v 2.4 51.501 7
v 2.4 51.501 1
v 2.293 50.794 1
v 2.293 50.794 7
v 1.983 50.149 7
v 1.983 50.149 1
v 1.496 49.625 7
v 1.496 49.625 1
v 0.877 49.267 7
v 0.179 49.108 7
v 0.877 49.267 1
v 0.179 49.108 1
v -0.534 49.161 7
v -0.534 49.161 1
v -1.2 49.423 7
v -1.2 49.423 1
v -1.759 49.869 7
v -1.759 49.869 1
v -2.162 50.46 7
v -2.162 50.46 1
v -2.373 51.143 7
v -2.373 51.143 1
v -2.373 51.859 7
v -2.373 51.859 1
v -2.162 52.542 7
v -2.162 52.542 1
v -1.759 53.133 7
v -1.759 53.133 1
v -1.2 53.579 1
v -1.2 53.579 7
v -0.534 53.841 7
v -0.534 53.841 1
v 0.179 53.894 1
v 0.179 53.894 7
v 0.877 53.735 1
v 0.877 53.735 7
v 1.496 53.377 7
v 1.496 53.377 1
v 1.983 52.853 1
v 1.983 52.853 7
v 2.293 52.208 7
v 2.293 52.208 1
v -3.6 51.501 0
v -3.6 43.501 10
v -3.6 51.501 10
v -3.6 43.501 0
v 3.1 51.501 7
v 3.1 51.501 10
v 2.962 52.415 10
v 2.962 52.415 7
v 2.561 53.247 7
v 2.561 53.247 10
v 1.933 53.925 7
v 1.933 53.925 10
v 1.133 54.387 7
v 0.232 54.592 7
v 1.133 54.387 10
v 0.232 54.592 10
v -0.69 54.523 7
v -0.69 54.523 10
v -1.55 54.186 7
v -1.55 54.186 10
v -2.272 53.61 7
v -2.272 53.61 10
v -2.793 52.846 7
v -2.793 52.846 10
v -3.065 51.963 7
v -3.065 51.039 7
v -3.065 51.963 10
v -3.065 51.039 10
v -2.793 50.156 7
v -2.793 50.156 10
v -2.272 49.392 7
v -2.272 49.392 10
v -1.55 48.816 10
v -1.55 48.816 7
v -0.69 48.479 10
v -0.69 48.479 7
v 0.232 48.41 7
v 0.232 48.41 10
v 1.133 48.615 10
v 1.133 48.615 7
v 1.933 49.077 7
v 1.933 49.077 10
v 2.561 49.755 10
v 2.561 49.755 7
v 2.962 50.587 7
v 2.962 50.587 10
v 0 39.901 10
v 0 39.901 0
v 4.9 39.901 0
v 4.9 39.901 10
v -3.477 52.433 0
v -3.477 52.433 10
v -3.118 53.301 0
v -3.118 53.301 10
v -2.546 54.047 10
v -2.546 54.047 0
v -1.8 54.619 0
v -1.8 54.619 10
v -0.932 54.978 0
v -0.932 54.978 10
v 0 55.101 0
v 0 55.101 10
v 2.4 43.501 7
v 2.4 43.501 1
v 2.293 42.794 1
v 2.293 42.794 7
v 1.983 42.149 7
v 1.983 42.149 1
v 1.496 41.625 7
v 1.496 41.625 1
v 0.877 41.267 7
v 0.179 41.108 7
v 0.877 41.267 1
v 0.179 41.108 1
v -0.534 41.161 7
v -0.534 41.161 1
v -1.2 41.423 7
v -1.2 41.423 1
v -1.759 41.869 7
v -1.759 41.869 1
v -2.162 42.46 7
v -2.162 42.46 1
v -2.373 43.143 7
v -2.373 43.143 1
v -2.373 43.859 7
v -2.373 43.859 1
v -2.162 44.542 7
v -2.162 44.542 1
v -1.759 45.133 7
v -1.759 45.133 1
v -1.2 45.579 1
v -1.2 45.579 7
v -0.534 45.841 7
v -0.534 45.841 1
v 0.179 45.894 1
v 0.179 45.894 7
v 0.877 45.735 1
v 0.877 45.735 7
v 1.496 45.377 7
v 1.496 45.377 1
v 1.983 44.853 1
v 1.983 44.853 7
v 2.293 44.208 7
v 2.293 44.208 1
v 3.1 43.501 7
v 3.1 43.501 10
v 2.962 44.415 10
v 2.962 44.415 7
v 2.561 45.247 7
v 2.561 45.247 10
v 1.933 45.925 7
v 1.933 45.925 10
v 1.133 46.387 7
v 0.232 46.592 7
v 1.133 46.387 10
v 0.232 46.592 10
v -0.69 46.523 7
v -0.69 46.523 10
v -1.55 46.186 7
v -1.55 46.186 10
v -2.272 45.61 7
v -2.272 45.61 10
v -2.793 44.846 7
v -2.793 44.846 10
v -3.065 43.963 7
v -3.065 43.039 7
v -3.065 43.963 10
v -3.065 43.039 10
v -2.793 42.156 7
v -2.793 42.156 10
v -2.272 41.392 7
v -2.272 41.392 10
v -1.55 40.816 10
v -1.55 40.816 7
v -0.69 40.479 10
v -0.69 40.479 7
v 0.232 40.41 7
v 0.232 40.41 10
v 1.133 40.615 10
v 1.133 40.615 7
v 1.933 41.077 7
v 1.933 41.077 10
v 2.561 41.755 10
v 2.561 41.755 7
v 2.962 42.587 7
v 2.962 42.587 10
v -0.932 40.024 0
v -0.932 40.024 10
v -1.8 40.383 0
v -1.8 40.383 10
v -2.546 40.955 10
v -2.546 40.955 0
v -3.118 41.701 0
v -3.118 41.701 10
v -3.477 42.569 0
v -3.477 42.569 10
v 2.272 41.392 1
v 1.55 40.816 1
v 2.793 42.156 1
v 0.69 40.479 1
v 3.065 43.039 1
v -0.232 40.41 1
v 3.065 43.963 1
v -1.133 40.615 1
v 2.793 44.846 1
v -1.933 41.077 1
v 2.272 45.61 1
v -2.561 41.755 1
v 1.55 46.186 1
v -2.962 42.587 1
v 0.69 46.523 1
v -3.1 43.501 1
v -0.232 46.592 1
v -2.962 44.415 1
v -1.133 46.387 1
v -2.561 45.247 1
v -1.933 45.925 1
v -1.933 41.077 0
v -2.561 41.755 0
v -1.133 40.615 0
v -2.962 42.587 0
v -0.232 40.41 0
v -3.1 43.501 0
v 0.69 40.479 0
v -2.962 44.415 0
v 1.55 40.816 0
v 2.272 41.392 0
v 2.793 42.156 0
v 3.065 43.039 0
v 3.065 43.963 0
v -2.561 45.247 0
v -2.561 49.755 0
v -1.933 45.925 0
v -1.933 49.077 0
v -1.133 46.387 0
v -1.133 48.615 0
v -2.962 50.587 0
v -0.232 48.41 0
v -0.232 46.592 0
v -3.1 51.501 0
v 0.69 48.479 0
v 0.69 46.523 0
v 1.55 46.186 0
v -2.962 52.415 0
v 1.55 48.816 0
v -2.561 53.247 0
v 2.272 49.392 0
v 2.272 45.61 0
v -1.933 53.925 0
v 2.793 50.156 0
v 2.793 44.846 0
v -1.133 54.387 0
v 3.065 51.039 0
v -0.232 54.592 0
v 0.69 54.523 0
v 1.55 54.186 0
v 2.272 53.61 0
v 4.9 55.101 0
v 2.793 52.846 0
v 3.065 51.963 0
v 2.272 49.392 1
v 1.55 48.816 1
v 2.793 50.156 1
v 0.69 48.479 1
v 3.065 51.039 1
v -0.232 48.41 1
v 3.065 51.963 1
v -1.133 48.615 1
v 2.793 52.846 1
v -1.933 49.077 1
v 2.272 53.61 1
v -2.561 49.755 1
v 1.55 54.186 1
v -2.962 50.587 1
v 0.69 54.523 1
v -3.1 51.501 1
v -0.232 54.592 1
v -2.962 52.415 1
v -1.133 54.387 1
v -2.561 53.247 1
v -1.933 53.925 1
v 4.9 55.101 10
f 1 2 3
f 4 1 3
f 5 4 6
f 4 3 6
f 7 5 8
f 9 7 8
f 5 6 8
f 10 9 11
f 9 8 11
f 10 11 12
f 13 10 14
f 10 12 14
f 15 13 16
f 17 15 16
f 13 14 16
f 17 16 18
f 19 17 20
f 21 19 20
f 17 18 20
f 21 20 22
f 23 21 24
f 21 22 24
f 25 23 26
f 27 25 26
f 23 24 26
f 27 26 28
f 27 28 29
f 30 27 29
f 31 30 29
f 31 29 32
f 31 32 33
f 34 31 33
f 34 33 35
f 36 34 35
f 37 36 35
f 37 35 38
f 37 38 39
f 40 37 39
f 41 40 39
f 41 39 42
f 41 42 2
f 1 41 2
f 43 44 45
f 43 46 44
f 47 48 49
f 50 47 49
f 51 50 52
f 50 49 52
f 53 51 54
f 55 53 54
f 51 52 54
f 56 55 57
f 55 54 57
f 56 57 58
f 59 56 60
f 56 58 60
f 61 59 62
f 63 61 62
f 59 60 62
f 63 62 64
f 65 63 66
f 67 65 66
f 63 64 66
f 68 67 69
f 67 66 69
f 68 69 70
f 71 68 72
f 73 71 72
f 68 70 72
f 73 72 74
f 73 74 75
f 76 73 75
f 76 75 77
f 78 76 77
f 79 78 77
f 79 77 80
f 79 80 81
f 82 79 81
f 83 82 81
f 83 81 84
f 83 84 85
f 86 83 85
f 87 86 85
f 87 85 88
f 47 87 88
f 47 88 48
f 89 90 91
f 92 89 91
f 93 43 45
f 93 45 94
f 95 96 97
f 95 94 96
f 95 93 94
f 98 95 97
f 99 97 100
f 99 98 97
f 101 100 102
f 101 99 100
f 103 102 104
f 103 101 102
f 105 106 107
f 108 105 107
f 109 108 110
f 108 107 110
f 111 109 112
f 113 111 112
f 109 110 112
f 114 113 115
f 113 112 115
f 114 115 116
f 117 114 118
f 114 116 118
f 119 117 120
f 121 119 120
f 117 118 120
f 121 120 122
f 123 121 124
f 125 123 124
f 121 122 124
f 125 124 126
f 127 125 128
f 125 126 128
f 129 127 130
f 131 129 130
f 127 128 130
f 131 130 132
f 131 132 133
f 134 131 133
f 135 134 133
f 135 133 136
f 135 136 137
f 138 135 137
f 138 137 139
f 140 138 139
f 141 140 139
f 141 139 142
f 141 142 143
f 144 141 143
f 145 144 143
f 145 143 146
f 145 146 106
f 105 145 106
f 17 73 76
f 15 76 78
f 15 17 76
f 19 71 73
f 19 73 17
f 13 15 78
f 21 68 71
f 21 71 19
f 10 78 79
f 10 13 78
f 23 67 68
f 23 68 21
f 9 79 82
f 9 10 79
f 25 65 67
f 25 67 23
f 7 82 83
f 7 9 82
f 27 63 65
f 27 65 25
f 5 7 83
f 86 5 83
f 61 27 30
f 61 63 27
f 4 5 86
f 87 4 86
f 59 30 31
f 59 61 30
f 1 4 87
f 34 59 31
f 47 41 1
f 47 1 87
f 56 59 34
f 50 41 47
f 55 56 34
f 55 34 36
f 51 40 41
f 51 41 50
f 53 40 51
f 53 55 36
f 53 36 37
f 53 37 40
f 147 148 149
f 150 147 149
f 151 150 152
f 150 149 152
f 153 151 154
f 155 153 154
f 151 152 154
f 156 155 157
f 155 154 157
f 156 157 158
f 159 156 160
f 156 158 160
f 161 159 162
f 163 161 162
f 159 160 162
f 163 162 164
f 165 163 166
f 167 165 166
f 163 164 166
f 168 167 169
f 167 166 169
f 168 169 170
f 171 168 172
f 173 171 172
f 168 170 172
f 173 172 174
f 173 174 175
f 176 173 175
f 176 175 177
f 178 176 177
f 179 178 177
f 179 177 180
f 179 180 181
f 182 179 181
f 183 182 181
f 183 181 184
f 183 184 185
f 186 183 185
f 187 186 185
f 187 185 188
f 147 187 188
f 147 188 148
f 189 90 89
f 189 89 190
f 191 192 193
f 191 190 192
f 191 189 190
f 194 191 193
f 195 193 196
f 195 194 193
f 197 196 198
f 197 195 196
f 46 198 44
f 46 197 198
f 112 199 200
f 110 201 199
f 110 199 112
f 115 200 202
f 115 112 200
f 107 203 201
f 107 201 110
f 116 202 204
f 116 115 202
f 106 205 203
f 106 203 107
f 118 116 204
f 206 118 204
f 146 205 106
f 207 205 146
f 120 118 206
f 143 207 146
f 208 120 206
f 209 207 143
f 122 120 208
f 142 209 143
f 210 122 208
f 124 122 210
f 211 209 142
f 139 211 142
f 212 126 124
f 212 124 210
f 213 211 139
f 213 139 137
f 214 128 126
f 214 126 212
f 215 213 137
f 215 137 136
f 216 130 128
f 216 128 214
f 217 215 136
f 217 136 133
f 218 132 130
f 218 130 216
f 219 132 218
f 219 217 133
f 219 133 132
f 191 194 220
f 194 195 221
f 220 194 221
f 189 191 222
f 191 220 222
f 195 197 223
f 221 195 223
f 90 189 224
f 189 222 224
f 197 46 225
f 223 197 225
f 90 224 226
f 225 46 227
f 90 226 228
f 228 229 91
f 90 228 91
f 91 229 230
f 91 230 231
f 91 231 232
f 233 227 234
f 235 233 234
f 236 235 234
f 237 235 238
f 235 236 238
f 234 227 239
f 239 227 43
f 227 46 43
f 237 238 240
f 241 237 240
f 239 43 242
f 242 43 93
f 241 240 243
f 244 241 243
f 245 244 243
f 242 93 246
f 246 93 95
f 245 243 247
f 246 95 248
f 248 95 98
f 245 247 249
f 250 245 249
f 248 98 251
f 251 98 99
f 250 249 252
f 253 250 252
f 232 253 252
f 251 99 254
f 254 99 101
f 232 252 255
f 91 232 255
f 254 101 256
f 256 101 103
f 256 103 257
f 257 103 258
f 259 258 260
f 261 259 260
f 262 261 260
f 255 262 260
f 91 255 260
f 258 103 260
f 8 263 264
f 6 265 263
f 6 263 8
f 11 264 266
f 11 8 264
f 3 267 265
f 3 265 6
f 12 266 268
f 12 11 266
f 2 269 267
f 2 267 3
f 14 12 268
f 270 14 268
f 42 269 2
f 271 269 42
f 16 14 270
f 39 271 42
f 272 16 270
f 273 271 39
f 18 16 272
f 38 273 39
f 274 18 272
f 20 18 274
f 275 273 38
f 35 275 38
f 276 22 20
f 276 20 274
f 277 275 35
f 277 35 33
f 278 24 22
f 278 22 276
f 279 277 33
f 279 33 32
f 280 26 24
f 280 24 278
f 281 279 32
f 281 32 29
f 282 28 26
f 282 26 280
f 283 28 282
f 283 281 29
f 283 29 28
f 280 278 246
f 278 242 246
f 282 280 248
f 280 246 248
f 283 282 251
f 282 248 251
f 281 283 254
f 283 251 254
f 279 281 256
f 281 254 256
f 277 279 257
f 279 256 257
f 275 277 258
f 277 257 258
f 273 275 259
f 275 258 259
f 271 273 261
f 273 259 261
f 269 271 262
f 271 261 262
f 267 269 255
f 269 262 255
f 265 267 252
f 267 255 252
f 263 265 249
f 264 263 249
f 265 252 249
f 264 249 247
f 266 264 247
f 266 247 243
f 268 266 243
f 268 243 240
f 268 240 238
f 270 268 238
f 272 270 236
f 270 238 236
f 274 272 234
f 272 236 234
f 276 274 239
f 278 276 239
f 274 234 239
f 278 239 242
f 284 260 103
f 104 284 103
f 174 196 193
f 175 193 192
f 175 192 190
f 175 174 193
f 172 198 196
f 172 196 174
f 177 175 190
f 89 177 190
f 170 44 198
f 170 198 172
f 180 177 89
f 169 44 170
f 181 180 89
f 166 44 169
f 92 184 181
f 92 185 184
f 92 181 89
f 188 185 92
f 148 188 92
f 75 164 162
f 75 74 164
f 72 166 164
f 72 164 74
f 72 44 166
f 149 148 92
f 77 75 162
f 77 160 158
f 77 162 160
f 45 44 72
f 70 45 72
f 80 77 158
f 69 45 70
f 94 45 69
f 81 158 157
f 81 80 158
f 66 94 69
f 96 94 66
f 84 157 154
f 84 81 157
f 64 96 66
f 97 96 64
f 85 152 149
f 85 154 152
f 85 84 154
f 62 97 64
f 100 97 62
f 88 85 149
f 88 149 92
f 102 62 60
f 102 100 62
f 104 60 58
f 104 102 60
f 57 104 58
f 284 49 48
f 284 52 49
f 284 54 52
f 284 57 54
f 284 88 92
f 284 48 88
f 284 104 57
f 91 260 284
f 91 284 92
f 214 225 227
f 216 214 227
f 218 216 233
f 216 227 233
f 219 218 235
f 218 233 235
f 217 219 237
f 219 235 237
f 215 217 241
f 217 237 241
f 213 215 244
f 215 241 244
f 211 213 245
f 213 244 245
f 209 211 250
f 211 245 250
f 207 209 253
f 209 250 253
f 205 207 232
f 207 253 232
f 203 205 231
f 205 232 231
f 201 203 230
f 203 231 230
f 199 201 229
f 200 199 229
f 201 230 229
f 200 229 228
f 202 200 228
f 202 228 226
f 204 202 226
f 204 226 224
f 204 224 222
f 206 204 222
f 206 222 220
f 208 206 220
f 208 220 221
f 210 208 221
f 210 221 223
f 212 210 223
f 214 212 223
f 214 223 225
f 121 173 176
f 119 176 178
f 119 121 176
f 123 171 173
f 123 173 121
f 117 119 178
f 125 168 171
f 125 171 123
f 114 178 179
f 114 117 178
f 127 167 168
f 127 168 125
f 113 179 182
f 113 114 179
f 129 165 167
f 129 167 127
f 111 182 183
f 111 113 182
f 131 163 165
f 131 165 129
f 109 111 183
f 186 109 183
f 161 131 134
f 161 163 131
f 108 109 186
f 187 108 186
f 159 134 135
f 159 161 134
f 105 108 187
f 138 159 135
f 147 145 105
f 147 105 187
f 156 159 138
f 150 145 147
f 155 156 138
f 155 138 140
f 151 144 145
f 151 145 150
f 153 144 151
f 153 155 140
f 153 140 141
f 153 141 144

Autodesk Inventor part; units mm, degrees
ref_plane "YZ Plane" through (0, 0, 0) normal (1, 0, 0) x (0, 1, 0)
ref_plane "XZ Plane" through (0, 0, 0) normal (0, 1, 0) x (-1, 0, 0)
ref_plane "XY Plane" through (0, 0, 0) normal (0, 0, 1) x (1, 0, 0)
sketch "Esboço1" plane through (0, 0, 0) normal (0, 0, 1) x (1, 0, 0)
  circle A0 centre (0, 51.501) radius 2.4 projected
  line L0 (4.9, 66.501) -> (4.9, -3.499) projected
  line L1 (-3.6, 3.501) -> (-3.6, 59.501) projected
  arc A1 (0, 55.101) -> (-3.6, 51.501) centre (0, 51.501) ccw
  circle A2 centre (0, 43.501) radius 2.4 projected
  arc A3 (-3.6, 43.501) -> (0, 39.901) centre (0, 43.501) ccw
  line L2 (4.9, 55.101) -> (0, 55.101)
  line L3 (0, 55.101) -> (0, 39.901)
  line L4 (0, 39.901) -> (4.9, 39.901)
  line L5 (4.9, 39.901) -> (4.9, 55.101)
  point P0 (0, 0)
extrude "Extrusão1" add sketch "Esboço1" along normal blind 10 contours A0 L3 L2 L0 L4 A2 | A0 L3 A2 A3 L1 A1
sketch "Esboço2" plane through (0, 0, 10) normal (0, 0, 1) x (1, 0, 0)
  circle A0 centre (0, 43.501) radius 3.1 projected
  circle A1 centre (0, 51.501) radius 3.1 projected
  point P0 (0, 0)
extrude "Extrusão2" cut sketch "Esboço2" against normal blind 3
sketch "Esboço3" plane through (0, 0, 0) normal (0, 0, -1) x (-1, 0, 0)
  circle A0 centre (0, 51.501) radius 3.1 projected
  circle A1 centre (0, 51.501) radius 2.4 projected
  circle A2 centre (0, 43.501) radius 3.1 projected
  circle A3 centre (0, 43.501) radius 2.4 projected
  point P0 (0, 0)
extrude "Extrusão3" cut sketch "Esboço3" against normal blind 1 contours A0 | A1 | A2 | A3
properties part number "suporte sensor de cor"
